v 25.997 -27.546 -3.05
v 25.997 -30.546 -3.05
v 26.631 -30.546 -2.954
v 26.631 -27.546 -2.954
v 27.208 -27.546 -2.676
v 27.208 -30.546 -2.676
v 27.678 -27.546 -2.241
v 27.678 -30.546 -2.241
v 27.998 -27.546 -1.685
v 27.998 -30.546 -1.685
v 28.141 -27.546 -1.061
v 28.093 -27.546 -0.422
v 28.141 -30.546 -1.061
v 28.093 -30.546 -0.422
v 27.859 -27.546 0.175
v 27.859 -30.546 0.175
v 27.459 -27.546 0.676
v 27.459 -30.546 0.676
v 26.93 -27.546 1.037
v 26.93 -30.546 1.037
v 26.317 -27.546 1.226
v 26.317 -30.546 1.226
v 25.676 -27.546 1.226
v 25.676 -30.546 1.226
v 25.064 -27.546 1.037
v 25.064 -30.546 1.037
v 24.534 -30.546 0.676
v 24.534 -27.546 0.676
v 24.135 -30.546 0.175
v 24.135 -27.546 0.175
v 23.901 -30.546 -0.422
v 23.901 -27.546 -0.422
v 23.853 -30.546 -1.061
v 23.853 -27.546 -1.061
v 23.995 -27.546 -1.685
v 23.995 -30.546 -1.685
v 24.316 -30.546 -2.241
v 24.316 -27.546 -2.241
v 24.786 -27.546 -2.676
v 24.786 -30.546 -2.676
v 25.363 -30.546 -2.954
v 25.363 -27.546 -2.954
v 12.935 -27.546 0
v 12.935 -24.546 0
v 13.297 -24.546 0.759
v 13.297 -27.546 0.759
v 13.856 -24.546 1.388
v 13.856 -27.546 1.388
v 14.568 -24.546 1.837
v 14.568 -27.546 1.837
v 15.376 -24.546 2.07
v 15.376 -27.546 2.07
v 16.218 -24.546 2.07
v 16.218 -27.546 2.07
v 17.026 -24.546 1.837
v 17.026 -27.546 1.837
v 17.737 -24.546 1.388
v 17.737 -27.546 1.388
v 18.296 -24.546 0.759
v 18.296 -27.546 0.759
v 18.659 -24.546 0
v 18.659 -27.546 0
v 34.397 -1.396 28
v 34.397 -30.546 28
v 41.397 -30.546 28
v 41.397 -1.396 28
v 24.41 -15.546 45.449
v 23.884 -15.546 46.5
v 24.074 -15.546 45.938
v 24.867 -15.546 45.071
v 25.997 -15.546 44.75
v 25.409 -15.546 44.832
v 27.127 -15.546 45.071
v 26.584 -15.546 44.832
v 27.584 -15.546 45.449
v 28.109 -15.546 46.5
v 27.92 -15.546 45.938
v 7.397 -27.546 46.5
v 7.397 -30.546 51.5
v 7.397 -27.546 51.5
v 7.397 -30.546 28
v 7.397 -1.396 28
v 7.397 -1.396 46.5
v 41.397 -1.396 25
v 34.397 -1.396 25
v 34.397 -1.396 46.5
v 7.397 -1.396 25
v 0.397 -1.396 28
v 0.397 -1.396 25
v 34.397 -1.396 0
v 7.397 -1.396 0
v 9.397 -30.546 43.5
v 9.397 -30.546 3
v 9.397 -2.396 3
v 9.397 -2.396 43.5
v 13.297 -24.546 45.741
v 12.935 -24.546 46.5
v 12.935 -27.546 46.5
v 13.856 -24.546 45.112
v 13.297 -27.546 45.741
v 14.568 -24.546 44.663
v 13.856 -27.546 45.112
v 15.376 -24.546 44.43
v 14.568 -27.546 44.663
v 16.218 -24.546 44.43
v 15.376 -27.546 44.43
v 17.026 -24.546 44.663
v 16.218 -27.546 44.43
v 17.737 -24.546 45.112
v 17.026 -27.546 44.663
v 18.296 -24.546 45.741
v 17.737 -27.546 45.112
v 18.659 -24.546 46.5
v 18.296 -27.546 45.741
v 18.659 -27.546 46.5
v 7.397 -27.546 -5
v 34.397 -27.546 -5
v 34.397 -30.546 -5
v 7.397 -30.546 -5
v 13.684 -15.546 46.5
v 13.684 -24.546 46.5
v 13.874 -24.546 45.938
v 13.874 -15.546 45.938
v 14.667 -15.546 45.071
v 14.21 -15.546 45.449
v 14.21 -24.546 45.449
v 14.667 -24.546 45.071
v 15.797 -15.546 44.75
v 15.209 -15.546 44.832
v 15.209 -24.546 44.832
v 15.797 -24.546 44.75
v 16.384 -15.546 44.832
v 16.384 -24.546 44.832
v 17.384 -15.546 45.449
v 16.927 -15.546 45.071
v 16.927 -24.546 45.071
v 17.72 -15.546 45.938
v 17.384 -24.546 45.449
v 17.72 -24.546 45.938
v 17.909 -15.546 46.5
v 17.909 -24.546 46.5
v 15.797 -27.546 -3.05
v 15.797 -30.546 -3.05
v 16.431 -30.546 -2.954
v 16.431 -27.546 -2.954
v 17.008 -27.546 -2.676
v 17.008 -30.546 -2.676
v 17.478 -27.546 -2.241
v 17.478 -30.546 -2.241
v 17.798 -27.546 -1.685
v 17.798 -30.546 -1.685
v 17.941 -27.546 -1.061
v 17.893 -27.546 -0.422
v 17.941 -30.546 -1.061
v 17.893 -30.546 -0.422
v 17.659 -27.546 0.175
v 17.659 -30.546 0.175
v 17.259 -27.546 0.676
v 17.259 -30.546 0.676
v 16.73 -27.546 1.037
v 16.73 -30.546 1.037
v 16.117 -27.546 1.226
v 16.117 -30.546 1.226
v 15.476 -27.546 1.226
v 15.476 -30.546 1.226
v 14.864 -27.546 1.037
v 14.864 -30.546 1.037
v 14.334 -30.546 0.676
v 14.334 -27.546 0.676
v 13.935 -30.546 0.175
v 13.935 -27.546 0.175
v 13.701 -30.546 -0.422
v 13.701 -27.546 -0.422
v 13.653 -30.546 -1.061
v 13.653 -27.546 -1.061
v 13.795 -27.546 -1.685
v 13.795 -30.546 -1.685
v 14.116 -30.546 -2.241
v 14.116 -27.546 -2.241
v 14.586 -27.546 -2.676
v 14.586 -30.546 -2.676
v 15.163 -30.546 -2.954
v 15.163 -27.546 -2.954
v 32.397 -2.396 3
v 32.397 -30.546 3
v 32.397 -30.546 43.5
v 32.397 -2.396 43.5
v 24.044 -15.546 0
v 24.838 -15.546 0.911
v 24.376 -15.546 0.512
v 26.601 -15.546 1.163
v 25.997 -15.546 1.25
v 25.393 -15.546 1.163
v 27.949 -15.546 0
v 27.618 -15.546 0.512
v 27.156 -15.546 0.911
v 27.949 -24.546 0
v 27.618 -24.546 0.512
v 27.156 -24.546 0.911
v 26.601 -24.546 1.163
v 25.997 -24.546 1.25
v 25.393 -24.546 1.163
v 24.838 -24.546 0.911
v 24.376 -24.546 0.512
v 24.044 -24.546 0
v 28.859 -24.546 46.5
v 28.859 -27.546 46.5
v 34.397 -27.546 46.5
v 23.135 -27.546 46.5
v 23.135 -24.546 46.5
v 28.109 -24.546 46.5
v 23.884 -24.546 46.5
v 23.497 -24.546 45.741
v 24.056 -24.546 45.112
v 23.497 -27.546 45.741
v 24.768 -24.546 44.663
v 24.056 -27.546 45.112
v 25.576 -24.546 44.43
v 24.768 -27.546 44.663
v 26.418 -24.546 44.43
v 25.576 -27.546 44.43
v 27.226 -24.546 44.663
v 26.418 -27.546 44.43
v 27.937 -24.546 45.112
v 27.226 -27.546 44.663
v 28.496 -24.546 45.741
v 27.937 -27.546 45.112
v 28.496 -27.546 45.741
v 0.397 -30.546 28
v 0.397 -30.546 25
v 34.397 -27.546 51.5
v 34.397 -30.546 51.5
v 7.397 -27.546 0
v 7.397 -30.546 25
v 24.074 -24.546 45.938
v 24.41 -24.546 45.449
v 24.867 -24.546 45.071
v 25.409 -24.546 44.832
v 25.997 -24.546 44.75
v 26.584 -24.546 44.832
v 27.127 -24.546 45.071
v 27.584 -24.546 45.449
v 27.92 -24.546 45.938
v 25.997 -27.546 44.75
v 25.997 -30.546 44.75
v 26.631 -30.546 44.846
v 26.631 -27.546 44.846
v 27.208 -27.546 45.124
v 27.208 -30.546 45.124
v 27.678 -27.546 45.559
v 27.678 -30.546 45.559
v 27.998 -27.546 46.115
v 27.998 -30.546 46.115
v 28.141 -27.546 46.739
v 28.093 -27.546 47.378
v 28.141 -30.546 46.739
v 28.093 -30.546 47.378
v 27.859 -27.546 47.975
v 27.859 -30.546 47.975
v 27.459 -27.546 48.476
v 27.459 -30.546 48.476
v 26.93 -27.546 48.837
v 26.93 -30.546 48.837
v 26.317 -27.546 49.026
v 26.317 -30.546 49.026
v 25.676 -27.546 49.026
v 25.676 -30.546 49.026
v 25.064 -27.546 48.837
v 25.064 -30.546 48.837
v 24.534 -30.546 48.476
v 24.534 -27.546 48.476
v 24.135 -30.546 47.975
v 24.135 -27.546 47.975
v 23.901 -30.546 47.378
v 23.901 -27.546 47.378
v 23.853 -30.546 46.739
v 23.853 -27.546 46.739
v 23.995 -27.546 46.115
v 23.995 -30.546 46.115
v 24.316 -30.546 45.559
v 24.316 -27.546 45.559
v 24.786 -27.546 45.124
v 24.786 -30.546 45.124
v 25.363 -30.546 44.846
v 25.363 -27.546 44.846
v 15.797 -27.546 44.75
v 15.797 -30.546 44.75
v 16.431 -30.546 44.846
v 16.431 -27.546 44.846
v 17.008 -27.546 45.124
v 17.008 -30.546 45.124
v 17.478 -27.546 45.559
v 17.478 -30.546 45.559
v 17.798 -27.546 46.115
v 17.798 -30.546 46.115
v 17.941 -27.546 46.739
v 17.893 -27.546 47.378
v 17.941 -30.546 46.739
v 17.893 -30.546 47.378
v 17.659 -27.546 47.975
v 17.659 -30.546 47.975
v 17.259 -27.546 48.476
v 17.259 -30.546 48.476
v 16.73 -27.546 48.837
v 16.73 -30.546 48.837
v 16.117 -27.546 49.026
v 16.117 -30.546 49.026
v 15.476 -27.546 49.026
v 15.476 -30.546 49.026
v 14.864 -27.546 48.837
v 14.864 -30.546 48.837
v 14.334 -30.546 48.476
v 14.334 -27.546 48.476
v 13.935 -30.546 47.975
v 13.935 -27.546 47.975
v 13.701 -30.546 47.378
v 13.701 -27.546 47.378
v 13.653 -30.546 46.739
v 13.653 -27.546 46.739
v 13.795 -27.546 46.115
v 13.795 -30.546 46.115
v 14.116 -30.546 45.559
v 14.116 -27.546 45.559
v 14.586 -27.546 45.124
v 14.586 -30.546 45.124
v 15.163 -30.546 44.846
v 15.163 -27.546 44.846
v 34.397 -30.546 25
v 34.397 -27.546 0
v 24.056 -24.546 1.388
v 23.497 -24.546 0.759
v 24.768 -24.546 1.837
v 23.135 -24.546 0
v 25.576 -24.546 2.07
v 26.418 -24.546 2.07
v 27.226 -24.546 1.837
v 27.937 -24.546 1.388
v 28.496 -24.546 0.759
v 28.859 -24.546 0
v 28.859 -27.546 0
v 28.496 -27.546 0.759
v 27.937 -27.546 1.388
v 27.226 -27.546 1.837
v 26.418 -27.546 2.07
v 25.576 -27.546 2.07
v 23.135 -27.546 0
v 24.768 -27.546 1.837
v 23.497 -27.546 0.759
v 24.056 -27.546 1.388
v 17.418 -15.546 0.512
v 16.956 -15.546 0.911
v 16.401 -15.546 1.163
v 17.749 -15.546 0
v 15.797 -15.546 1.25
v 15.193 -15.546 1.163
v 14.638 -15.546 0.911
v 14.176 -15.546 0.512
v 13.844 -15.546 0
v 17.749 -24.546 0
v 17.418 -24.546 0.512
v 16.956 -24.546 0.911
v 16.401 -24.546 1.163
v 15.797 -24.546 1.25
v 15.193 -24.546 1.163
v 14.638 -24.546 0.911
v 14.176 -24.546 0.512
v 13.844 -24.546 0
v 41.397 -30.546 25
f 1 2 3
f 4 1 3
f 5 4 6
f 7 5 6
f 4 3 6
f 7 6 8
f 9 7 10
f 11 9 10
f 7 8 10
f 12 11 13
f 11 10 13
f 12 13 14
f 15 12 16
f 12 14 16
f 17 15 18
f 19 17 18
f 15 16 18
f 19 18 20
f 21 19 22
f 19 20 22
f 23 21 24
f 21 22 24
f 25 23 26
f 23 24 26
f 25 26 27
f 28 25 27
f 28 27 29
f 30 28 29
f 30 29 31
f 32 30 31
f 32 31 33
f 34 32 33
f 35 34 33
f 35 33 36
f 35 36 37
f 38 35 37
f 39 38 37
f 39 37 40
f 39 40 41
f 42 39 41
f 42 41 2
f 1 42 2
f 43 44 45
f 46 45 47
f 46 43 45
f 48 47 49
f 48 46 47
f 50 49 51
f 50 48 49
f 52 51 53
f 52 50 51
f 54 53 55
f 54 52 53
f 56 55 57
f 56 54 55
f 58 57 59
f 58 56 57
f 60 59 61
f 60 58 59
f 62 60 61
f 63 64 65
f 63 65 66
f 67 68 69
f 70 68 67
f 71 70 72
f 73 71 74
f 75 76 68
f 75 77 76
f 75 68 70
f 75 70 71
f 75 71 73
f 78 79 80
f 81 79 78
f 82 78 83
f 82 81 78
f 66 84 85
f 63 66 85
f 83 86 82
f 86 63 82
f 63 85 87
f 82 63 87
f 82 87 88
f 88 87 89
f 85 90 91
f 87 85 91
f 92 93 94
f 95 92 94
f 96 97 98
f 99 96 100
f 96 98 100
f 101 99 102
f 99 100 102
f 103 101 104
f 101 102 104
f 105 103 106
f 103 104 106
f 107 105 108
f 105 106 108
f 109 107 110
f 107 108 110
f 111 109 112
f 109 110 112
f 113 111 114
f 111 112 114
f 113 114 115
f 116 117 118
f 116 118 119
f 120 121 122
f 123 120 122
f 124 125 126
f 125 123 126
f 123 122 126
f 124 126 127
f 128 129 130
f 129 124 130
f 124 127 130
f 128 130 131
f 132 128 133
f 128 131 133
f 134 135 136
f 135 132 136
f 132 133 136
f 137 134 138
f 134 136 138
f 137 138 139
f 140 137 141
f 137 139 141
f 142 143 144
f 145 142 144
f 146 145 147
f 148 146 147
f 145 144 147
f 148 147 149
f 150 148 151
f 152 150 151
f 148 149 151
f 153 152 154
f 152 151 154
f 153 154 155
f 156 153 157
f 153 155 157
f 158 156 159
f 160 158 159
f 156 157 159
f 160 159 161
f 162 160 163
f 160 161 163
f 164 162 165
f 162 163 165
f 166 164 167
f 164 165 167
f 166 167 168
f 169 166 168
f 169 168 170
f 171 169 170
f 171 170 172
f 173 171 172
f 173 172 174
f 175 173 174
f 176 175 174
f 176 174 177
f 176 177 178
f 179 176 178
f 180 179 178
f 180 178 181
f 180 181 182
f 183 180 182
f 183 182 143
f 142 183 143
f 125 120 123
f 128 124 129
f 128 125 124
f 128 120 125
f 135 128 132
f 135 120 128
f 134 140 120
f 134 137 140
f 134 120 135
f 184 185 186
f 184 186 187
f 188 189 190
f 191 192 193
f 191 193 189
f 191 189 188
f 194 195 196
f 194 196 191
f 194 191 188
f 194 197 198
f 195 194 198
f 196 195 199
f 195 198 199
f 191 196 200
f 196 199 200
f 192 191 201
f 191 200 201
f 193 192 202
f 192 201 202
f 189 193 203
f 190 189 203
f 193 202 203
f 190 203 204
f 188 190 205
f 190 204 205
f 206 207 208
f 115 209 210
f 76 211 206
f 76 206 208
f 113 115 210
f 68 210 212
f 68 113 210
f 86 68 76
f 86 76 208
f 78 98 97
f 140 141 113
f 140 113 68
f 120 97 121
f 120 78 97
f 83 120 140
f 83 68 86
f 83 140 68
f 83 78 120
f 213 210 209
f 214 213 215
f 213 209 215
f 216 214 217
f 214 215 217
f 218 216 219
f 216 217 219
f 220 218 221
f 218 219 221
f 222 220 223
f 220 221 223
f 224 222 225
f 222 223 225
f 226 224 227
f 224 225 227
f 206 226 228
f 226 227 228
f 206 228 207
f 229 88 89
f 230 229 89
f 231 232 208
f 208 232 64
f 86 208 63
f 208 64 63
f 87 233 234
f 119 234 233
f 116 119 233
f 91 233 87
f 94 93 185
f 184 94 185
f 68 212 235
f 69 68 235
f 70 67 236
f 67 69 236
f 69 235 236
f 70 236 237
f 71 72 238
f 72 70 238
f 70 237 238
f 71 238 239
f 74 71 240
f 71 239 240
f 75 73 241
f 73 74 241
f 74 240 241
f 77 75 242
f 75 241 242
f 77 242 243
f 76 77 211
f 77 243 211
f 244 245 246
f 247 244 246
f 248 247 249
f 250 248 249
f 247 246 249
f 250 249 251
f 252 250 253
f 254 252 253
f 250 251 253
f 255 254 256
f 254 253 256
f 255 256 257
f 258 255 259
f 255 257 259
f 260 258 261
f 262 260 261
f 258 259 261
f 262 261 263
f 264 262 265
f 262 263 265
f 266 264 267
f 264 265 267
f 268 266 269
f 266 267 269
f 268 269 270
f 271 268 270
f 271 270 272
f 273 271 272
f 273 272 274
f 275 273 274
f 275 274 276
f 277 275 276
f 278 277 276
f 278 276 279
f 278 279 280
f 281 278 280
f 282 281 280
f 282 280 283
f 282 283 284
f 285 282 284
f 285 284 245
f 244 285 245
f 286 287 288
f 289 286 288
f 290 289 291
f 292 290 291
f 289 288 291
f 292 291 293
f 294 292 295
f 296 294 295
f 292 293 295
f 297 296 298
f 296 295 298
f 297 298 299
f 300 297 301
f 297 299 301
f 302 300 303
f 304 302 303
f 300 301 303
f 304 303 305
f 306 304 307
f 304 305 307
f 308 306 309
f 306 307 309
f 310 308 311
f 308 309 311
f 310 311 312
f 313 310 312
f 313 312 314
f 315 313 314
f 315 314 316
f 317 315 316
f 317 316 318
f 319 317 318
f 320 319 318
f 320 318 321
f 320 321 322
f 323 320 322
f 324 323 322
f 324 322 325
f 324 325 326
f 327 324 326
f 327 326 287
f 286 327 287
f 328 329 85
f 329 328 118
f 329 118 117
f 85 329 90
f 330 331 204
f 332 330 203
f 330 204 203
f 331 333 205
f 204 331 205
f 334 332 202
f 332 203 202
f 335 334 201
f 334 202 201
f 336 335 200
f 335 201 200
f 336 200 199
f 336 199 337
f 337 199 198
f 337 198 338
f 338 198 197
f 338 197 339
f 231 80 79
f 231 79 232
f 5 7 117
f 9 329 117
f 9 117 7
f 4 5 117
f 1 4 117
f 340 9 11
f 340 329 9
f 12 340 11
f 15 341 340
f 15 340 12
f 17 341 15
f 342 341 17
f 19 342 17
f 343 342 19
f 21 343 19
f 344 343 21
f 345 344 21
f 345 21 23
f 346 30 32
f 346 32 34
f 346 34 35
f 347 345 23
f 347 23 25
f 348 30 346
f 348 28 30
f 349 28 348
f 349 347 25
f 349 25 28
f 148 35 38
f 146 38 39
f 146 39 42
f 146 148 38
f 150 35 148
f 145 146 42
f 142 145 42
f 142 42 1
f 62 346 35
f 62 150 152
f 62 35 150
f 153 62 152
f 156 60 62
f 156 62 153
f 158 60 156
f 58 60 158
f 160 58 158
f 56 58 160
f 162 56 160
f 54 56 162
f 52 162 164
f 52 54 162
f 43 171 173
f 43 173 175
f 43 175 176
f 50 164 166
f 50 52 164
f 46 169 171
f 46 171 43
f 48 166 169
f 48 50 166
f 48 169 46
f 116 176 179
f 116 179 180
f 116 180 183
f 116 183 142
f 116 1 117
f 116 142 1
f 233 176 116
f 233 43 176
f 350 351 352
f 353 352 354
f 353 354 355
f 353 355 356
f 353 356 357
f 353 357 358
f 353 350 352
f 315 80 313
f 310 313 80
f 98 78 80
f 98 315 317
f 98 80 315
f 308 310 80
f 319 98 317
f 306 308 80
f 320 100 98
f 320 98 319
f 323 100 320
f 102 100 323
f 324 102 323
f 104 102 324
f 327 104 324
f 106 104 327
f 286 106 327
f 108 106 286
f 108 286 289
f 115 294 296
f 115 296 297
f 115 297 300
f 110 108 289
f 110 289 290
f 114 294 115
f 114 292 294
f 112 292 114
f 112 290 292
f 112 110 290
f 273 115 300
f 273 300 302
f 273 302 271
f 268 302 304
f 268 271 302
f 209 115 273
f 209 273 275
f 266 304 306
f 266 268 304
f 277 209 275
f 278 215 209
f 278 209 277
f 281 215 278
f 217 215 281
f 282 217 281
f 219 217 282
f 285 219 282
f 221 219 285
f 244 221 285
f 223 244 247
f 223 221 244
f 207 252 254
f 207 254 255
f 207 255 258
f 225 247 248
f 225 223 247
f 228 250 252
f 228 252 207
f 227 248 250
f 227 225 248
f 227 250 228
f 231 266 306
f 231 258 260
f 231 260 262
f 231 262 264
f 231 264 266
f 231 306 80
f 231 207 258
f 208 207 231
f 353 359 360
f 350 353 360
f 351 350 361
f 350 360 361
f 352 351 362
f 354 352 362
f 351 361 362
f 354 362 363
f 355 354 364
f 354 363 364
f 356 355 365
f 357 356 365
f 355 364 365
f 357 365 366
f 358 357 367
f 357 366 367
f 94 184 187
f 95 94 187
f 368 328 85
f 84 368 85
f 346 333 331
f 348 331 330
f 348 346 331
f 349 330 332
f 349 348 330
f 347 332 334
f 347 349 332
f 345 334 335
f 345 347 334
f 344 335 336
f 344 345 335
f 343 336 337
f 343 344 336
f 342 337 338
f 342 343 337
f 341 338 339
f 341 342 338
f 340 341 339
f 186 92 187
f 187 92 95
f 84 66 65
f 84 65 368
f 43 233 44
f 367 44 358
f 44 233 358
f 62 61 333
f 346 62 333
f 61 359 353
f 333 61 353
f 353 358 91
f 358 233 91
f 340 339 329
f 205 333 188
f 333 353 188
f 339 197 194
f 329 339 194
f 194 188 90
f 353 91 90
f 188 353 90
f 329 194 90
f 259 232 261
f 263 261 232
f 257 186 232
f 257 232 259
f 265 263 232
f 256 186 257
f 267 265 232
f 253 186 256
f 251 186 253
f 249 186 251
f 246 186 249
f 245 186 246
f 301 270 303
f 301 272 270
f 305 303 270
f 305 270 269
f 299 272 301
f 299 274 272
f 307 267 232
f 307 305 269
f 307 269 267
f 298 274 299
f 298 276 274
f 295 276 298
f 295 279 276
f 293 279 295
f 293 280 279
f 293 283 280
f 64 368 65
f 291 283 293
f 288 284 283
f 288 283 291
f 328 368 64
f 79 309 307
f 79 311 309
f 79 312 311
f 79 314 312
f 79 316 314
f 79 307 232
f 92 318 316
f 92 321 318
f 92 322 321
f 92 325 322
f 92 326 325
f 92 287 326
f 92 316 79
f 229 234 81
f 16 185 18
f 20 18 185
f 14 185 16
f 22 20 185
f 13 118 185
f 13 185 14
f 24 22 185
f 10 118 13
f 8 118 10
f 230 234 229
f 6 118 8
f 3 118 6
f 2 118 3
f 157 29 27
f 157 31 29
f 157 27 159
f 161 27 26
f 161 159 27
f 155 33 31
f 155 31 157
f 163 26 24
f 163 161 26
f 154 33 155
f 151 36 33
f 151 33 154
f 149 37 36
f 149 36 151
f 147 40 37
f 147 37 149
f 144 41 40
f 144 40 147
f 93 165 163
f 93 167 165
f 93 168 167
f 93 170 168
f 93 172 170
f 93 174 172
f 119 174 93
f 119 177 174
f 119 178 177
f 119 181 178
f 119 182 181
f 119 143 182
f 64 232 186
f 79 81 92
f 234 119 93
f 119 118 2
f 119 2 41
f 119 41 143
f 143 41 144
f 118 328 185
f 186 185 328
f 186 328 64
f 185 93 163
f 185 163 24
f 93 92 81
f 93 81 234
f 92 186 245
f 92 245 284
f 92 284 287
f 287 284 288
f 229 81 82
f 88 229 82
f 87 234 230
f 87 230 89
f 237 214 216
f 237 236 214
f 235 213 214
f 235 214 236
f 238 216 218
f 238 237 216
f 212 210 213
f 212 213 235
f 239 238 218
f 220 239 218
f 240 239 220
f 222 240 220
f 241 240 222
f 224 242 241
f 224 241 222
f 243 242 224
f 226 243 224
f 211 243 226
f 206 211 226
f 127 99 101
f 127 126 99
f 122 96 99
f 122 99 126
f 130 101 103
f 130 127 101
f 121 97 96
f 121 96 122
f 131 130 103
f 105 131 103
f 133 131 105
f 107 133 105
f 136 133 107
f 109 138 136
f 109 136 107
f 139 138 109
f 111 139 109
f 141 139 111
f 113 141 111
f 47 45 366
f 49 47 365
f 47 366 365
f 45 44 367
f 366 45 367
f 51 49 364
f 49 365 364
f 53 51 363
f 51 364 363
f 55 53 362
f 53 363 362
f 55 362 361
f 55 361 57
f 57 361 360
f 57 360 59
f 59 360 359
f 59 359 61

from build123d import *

# Parameters (mm, degrees)
BOSS_EXTRUDE1_DEPTH  = 3
SKETCH2_W            = 27
SKETCH2_H            = 3
BOSS_EXTRUDE2_DEPTH  = 5
SKETCH3_R            = 2.15
CUT_EXTRUDE1_DEPTH   = 15
SKETCH5_R            = 3
CUT_EXTRUDE3_DEPTH   = 3
SKETCH7_W            = 2
SKETCH7_H            = 29.15
BOSS_EXTRUDE6_DEPTH  = 43.5
SKETCH8_W            = 3
SKETCH8_H            = 29.15
BOSS_EXTRUDE7_DEPTH  = 25
SKETCH9_W            = 27
SKETCH9_H            = 3
BOSS_EXTRUDE8_DEPTH  = 5
SKETCH10_R           = 2.15
CUT_EXTRUDE4_DEPTH   = 15
SKETCH11_W           = 40.5
SKETCH11_H           = 1
BOSS_EXTRUDE9_DEPTH  = 23
SKETCH12_W           = 3
SKETCH12_H           = 29.15
BOSS_EXTRUDE10_DEPTH = 7


with BuildPart() as part:
    # Sketch1 → Boss-Extrude1 (new body)
    with BuildSketch(Plane.XY):
        Polygon((7.396868841, -30.545988075), (34.396868841, -30.545988075), (34.396868841, -3.045988075), (34.396868841, -1.395988075), (7.396868841, -1.395988075), (7.396868841, -3.045988075), align=None)
    extrude(amount=BOSS_EXTRUDE1_DEPTH)

    # Sketch2 → Boss-Extrude2 (add)
    with BuildSketch(Plane(origin=(0, 0, 0), x_dir=(-1, 0, 0), z_dir=(0, 0, -1))):
        with Locations((-20.896868841, -29.045988075)):
            Rectangle(SKETCH2_W, SKETCH2_H)
    extrude(amount=BOSS_EXTRUDE2_DEPTH)

    # Sketch3 → Cut-Extrude1 (cut)
    with BuildSketch(Plane.XZ.offset(30.545988075)):
        with Locations(Location((15.796868841, -0.9, 0), (0, 0, 270))):
            Circle(SKETCH3_R)
        with Locations(Location((25.996868841, -0.9, 0), (0, 0, 270))):
            Circle(SKETCH3_R)
    extrude(amount=-CUT_EXTRUDE1_DEPTH, mode=Mode.SUBTRACT)

    # Sketch5 → Cut-Extrude3 (cut)
    with BuildSketch(Plane(origin=(0, -27.545988075, 0), x_dir=(1, 0, 0), z_dir=(0, 1, 0))):
        with Locations((15.796868841, 0.9)):
            Circle(SKETCH5_R)
        with Locations((25.996868841, 0.9)):
            Circle(SKETCH5_R)
    cut_extrude3 = extrude(amount=CUT_EXTRUDE3_DEPTH, mode=Mode.SUBTRACT)

    # Sketch7 → Boss-Extrude6 (add)
    with BuildSketch(Plane.XY.offset(3)):
        with Locations((8.396868841, -15.970988075)):
            Rectangle(SKETCH7_W, SKETCH7_H)
    boss_extrude6 = extrude(amount=BOSS_EXTRUDE6_DEPTH)

    # Sketch8 → Boss-Extrude7 (add)
    with BuildSketch(Plane(origin=(9.396868841, 0, 0), x_dir=(0, 0, -1), z_dir=(1, 0, 0))):
        with Locations((-45, -15.970988075)):
            Rectangle(SKETCH8_W, SKETCH8_H)
    extrude(amount=BOSS_EXTRUDE7_DEPTH)

    # Sketch9 → Boss-Extrude8 (add)
    with BuildSketch(Plane.XY.offset(46.5)):
        with Locations((20.896868841, -29.045988075)):
            Rectangle(SKETCH9_W, SKETCH9_H)
    extrude(amount=BOSS_EXTRUDE8_DEPTH)

    # Sketch10 → Cut-Extrude4 (cut)
    with BuildSketch(Plane.XZ.offset(30.545988075)):
        with Locations(Location((25.996868841, 46.9, 0), (0, 0, 270))):
            Circle(SKETCH10_R)
        with Locations(Location((15.796868841, 46.9, 0), (0, 0, 270))):
            Circle(SKETCH10_R)
    extrude(amount=-CUT_EXTRUDE4_DEPTH, mode=Mode.SUBTRACT)

    # Mirror1: Cut-Extrude3 across plane
    add(cut_extrude3.mirror(Plane(origin=(0, 0, 23.25), x_dir=(1, 0, 0), z_dir=(0, 0, -1))), mode=Mode.SUBTRACT)

    # Mirror2: Boss-Extrude6 across plane
    add(boss_extrude6.mirror(Plane.ZY.offset(-20.896868841)))

    # Sketch11 → Boss-Extrude9 (add)
    with BuildSketch(Plane.ZY.offset(-32.396868841)):
        with Locations((23.25, -1.895988075)):
            Rectangle(SKETCH11_W, SKETCH11_H)
    extrude(amount=BOSS_EXTRUDE9_DEPTH)

    # Sketch12 → Boss-Extrude10 (add)
    with BuildSketch(Plane(origin=(34.396868841, 0, 0), x_dir=(0, 0, -1), z_dir=(1, 0, 0))):
        with Locations((-26.5, -15.970988075)):
            Rectangle(SKETCH12_W, SKETCH12_H)
    boss_extrude10 = extrude(amount=BOSS_EXTRUDE10_DEPTH)

    # Mirror3: Boss-Extrude10 across plane
    add(boss_extrude10.mirror(Plane.ZY.offset(-20.896868841)))


solid = part.part
